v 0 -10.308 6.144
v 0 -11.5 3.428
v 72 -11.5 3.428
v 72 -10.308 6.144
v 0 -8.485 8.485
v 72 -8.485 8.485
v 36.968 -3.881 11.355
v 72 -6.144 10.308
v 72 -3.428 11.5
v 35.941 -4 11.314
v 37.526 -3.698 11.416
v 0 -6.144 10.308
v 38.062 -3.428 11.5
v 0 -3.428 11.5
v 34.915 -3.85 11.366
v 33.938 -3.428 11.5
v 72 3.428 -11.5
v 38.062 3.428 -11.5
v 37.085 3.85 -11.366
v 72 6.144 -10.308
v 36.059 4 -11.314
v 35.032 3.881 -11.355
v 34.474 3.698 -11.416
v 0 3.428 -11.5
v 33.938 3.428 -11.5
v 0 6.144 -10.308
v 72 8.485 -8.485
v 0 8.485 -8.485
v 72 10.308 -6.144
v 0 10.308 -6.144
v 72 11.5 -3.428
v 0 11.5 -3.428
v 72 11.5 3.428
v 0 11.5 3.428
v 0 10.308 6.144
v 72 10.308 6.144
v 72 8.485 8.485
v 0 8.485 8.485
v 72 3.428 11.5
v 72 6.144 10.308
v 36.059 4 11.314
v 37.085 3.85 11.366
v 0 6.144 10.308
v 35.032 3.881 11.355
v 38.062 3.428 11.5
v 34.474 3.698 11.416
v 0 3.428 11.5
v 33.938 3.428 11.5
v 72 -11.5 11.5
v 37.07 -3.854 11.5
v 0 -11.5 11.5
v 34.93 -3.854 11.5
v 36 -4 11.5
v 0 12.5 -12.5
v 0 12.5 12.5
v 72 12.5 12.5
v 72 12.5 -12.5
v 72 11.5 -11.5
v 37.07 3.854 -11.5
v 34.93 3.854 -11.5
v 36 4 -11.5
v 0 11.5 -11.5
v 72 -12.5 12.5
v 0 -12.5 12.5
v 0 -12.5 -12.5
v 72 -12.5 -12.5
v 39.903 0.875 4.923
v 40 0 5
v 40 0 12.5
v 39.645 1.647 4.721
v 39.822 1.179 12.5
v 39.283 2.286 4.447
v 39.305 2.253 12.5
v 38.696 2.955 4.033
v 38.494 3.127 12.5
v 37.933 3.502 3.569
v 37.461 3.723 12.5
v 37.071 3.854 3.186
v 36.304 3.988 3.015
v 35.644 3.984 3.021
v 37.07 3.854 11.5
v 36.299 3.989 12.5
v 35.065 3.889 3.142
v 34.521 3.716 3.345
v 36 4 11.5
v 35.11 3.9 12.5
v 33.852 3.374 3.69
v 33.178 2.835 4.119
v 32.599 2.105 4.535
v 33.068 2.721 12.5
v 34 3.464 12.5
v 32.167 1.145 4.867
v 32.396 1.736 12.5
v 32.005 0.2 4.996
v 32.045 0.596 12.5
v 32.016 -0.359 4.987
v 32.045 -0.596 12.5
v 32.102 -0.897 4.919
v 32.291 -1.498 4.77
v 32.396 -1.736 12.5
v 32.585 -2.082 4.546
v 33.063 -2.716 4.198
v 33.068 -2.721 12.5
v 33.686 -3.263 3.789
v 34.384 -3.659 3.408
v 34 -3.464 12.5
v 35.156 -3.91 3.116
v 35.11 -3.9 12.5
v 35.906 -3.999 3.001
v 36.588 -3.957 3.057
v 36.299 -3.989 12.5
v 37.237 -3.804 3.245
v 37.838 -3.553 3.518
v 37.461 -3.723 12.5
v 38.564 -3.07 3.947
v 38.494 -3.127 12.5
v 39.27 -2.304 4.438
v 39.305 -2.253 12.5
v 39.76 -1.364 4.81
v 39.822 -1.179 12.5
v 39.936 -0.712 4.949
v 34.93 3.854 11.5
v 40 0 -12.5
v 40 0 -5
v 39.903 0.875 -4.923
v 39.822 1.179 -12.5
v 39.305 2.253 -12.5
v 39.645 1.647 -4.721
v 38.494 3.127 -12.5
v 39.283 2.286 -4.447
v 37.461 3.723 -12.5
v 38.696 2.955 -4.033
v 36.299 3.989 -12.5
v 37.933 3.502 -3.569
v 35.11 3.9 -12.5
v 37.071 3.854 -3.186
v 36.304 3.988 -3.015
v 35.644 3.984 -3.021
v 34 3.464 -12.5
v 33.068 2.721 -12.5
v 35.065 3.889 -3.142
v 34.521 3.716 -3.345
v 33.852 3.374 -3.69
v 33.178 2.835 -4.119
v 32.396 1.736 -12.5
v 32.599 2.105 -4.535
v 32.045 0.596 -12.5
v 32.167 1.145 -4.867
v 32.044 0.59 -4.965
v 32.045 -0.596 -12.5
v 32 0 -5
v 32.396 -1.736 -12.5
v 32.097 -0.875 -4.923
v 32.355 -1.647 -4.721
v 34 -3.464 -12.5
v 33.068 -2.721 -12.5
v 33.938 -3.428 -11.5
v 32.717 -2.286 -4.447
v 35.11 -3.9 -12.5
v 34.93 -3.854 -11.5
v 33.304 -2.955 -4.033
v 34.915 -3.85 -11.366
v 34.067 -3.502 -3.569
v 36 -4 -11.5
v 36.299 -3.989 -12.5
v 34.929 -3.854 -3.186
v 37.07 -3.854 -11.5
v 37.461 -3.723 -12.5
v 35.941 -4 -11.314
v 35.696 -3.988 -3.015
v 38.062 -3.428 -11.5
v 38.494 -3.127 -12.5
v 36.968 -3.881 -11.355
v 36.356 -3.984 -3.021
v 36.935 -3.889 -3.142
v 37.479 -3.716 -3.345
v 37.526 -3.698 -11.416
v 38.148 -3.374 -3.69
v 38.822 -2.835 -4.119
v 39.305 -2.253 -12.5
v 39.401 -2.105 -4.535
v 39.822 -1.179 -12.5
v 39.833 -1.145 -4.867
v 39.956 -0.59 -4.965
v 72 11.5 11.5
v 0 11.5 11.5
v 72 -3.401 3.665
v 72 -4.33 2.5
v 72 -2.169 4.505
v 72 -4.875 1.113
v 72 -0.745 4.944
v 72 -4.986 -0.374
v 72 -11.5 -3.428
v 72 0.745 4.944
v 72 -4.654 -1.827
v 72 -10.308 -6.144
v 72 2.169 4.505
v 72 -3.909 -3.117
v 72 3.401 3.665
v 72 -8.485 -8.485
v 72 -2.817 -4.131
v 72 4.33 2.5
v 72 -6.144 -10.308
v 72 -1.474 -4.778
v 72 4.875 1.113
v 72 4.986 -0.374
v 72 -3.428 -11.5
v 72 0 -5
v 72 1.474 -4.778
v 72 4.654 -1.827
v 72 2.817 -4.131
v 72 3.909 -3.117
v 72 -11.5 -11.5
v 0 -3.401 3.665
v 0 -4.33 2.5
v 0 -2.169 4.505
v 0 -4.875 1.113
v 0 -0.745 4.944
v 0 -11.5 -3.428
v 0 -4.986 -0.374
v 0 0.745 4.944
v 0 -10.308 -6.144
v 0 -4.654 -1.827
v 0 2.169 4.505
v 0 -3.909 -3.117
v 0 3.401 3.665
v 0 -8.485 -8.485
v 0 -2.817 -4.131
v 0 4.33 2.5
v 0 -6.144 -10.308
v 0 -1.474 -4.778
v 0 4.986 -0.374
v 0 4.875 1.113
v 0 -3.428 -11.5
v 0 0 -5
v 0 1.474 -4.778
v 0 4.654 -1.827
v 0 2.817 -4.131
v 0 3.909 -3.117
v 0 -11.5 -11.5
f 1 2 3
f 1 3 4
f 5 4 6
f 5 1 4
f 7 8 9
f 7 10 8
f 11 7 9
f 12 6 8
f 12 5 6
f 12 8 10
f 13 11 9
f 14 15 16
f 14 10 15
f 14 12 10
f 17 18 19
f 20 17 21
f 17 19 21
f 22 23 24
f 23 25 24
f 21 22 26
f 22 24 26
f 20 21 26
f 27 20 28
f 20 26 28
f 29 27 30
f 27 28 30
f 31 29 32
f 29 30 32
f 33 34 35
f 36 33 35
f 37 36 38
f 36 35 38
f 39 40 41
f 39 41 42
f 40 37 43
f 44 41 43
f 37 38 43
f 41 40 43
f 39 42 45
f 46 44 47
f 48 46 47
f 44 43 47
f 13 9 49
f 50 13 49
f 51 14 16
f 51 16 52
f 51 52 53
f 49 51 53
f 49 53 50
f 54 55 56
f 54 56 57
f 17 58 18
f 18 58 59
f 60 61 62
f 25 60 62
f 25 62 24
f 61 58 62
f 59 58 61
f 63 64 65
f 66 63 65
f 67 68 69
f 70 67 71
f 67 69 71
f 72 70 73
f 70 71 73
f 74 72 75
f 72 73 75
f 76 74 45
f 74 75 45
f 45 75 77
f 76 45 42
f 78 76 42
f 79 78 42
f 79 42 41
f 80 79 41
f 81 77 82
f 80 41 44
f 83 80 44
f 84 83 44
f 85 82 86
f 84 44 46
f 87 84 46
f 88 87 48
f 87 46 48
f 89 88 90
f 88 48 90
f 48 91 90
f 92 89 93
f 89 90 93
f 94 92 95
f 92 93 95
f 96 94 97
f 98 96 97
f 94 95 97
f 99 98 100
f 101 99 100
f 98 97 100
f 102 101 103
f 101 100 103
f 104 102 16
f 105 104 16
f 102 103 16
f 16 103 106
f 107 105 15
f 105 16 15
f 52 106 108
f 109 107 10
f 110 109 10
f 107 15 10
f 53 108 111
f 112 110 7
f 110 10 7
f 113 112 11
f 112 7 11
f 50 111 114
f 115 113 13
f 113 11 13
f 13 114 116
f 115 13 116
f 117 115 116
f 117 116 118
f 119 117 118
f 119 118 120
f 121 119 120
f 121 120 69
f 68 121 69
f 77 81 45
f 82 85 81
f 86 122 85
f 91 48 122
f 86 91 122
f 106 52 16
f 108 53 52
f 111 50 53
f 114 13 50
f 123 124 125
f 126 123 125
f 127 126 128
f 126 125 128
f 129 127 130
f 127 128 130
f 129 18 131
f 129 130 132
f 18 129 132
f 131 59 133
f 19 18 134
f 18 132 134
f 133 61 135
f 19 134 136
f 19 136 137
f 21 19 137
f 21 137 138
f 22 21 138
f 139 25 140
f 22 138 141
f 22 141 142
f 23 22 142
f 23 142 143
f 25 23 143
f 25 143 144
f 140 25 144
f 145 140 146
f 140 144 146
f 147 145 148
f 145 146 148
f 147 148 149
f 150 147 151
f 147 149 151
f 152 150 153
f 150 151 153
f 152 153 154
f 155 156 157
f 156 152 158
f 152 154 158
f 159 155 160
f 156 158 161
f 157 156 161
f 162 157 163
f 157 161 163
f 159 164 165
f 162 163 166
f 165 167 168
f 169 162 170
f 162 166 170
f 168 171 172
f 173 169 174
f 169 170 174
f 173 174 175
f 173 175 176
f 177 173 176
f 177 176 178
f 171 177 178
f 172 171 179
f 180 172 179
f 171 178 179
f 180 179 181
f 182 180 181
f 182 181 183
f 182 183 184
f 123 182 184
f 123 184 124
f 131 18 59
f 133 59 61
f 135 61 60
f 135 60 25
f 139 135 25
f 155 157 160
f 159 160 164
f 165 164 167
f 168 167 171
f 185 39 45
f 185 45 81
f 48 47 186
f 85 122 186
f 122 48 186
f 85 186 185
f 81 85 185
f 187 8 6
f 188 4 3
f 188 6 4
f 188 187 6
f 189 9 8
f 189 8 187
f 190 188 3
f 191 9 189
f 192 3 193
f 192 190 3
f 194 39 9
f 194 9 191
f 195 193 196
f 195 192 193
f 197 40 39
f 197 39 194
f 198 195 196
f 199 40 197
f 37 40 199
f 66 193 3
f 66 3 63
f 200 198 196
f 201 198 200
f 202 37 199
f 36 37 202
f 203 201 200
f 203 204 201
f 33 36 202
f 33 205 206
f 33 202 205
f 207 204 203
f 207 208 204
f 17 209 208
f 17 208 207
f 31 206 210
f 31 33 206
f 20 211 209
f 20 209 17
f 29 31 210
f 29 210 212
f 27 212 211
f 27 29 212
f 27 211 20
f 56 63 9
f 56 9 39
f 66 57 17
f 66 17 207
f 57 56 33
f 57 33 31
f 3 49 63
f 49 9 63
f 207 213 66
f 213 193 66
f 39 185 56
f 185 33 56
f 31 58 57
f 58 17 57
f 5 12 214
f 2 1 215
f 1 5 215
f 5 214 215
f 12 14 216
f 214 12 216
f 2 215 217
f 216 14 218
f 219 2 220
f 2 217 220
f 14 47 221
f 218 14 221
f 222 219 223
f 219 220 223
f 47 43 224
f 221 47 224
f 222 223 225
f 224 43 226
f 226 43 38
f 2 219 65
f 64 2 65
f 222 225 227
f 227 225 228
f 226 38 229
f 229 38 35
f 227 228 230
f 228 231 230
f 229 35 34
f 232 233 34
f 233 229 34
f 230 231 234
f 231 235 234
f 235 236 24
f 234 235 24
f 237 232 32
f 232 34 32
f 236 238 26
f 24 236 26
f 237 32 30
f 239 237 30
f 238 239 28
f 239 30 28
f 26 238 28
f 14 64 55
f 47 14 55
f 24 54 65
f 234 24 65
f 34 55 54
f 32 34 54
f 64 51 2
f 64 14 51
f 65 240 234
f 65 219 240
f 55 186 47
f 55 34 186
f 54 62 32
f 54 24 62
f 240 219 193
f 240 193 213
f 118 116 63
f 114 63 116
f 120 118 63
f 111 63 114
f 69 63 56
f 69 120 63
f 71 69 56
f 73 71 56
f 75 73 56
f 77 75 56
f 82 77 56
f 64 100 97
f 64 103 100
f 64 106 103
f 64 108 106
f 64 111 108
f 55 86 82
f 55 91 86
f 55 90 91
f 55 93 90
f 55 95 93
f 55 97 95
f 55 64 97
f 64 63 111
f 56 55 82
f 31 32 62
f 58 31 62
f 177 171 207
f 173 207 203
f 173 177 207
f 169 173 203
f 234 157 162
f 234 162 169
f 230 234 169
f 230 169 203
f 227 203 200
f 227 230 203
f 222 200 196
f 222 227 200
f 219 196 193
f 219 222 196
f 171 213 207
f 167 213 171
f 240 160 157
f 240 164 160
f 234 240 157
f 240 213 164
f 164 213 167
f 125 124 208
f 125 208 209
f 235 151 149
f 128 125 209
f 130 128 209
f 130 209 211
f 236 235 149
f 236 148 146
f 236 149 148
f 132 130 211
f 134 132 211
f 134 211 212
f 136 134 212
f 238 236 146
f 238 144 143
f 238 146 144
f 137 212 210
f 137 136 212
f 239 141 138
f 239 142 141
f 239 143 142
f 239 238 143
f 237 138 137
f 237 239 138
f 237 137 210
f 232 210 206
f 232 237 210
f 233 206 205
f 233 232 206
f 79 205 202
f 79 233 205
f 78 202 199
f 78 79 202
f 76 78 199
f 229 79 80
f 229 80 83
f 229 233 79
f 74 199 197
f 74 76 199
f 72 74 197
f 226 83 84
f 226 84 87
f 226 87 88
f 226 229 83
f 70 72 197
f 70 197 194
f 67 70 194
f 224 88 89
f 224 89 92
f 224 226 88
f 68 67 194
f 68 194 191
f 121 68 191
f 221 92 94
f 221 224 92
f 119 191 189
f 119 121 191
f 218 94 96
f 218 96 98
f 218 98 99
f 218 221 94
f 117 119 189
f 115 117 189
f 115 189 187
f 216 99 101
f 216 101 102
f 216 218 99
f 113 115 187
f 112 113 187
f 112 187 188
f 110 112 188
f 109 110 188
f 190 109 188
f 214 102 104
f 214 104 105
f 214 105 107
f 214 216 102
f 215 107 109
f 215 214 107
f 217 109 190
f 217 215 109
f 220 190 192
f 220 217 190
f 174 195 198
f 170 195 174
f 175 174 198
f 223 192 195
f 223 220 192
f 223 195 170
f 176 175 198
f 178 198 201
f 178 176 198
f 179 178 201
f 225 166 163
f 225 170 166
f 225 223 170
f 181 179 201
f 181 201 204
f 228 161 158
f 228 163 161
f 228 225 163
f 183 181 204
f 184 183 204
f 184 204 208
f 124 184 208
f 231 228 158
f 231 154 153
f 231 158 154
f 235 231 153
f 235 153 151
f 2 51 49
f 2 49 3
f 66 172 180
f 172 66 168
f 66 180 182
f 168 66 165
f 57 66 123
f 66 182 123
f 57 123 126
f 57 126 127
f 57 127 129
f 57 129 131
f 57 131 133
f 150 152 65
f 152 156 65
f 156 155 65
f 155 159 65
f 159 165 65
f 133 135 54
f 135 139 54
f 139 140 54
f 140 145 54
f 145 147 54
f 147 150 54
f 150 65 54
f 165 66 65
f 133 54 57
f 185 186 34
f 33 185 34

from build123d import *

# Parameters (mm, degrees)
SKETCH1_W           = 25
SKETCH1_H           = 25
SKETCH1_R           = 5
BOSS_EXTRUDE1_DEPTH = 72
SKETCH2_R           = 4
CUT_EXTRUDE1_DEPTH  = 78.235030912


with BuildPart() as part:
    # Sketch1 → Boss-Extrude1 (new body)
    with BuildSketch(Plane(origin=(0, 0, 0), x_dir=(0, 0, -1), z_dir=(1, 0, 0))):
        Rectangle(SKETCH1_W, SKETCH1_H)
        Circle(SKETCH1_R, mode=Mode.SUBTRACT)
        with BuildLine():
            Line((-11.5, -11.5), (-3.4278273, -11.5))
            ThreePointArc((-3.4278273, -11.5), (-8.485281374, -8.485281374), (-11.5, -3.4278273))
            Line((-11.5, -3.4278273), (-11.5, -11.5))
        make_face(mode=Mode.SUBTRACT)
        with BuildLine():
            Line((-11.5, 11.5), (-3.4278273, 11.5))
            ThreePointArc((-3.4278273, 11.5), (-8.485281374, 8.485281374), (-11.5, 3.4278273))
            Line((-11.5, 3.4278273), (-11.5, 11.5))
        make_face(mode=Mode.SUBTRACT)
        with BuildLine():
            Line((11.5, -11.5), (11.5, -3.4278273))
            ThreePointArc((11.5, -3.4278273), (8.485281374, -8.485281374), (3.4278273, -11.5))
            Line((3.4278273, -11.5), (11.5, -11.5))
        make_face(mode=Mode.SUBTRACT)
        with BuildLine():
            Line((3.4278273, 11.5), (11.5, 11.5))
            Line((11.5, 11.5), (11.5, 3.4278273))
            ThreePointArc((11.5, 3.4278273), (8.485281374, 8.485281374), (3.4278273, 11.5))
        make_face(mode=Mode.SUBTRACT)
    extrude(amount=BOSS_EXTRUDE1_DEPTH)

    # Sketch2 → Cut-Extrude1 (cut, through all)
    with BuildSketch(Plane.XY.offset(12.5)):
        with Locations((36, 0)):
            Circle(SKETCH2_R)
    extrude(amount=-CUT_EXTRUDE1_DEPTH, mode=Mode.SUBTRACT)


solid = part.part
